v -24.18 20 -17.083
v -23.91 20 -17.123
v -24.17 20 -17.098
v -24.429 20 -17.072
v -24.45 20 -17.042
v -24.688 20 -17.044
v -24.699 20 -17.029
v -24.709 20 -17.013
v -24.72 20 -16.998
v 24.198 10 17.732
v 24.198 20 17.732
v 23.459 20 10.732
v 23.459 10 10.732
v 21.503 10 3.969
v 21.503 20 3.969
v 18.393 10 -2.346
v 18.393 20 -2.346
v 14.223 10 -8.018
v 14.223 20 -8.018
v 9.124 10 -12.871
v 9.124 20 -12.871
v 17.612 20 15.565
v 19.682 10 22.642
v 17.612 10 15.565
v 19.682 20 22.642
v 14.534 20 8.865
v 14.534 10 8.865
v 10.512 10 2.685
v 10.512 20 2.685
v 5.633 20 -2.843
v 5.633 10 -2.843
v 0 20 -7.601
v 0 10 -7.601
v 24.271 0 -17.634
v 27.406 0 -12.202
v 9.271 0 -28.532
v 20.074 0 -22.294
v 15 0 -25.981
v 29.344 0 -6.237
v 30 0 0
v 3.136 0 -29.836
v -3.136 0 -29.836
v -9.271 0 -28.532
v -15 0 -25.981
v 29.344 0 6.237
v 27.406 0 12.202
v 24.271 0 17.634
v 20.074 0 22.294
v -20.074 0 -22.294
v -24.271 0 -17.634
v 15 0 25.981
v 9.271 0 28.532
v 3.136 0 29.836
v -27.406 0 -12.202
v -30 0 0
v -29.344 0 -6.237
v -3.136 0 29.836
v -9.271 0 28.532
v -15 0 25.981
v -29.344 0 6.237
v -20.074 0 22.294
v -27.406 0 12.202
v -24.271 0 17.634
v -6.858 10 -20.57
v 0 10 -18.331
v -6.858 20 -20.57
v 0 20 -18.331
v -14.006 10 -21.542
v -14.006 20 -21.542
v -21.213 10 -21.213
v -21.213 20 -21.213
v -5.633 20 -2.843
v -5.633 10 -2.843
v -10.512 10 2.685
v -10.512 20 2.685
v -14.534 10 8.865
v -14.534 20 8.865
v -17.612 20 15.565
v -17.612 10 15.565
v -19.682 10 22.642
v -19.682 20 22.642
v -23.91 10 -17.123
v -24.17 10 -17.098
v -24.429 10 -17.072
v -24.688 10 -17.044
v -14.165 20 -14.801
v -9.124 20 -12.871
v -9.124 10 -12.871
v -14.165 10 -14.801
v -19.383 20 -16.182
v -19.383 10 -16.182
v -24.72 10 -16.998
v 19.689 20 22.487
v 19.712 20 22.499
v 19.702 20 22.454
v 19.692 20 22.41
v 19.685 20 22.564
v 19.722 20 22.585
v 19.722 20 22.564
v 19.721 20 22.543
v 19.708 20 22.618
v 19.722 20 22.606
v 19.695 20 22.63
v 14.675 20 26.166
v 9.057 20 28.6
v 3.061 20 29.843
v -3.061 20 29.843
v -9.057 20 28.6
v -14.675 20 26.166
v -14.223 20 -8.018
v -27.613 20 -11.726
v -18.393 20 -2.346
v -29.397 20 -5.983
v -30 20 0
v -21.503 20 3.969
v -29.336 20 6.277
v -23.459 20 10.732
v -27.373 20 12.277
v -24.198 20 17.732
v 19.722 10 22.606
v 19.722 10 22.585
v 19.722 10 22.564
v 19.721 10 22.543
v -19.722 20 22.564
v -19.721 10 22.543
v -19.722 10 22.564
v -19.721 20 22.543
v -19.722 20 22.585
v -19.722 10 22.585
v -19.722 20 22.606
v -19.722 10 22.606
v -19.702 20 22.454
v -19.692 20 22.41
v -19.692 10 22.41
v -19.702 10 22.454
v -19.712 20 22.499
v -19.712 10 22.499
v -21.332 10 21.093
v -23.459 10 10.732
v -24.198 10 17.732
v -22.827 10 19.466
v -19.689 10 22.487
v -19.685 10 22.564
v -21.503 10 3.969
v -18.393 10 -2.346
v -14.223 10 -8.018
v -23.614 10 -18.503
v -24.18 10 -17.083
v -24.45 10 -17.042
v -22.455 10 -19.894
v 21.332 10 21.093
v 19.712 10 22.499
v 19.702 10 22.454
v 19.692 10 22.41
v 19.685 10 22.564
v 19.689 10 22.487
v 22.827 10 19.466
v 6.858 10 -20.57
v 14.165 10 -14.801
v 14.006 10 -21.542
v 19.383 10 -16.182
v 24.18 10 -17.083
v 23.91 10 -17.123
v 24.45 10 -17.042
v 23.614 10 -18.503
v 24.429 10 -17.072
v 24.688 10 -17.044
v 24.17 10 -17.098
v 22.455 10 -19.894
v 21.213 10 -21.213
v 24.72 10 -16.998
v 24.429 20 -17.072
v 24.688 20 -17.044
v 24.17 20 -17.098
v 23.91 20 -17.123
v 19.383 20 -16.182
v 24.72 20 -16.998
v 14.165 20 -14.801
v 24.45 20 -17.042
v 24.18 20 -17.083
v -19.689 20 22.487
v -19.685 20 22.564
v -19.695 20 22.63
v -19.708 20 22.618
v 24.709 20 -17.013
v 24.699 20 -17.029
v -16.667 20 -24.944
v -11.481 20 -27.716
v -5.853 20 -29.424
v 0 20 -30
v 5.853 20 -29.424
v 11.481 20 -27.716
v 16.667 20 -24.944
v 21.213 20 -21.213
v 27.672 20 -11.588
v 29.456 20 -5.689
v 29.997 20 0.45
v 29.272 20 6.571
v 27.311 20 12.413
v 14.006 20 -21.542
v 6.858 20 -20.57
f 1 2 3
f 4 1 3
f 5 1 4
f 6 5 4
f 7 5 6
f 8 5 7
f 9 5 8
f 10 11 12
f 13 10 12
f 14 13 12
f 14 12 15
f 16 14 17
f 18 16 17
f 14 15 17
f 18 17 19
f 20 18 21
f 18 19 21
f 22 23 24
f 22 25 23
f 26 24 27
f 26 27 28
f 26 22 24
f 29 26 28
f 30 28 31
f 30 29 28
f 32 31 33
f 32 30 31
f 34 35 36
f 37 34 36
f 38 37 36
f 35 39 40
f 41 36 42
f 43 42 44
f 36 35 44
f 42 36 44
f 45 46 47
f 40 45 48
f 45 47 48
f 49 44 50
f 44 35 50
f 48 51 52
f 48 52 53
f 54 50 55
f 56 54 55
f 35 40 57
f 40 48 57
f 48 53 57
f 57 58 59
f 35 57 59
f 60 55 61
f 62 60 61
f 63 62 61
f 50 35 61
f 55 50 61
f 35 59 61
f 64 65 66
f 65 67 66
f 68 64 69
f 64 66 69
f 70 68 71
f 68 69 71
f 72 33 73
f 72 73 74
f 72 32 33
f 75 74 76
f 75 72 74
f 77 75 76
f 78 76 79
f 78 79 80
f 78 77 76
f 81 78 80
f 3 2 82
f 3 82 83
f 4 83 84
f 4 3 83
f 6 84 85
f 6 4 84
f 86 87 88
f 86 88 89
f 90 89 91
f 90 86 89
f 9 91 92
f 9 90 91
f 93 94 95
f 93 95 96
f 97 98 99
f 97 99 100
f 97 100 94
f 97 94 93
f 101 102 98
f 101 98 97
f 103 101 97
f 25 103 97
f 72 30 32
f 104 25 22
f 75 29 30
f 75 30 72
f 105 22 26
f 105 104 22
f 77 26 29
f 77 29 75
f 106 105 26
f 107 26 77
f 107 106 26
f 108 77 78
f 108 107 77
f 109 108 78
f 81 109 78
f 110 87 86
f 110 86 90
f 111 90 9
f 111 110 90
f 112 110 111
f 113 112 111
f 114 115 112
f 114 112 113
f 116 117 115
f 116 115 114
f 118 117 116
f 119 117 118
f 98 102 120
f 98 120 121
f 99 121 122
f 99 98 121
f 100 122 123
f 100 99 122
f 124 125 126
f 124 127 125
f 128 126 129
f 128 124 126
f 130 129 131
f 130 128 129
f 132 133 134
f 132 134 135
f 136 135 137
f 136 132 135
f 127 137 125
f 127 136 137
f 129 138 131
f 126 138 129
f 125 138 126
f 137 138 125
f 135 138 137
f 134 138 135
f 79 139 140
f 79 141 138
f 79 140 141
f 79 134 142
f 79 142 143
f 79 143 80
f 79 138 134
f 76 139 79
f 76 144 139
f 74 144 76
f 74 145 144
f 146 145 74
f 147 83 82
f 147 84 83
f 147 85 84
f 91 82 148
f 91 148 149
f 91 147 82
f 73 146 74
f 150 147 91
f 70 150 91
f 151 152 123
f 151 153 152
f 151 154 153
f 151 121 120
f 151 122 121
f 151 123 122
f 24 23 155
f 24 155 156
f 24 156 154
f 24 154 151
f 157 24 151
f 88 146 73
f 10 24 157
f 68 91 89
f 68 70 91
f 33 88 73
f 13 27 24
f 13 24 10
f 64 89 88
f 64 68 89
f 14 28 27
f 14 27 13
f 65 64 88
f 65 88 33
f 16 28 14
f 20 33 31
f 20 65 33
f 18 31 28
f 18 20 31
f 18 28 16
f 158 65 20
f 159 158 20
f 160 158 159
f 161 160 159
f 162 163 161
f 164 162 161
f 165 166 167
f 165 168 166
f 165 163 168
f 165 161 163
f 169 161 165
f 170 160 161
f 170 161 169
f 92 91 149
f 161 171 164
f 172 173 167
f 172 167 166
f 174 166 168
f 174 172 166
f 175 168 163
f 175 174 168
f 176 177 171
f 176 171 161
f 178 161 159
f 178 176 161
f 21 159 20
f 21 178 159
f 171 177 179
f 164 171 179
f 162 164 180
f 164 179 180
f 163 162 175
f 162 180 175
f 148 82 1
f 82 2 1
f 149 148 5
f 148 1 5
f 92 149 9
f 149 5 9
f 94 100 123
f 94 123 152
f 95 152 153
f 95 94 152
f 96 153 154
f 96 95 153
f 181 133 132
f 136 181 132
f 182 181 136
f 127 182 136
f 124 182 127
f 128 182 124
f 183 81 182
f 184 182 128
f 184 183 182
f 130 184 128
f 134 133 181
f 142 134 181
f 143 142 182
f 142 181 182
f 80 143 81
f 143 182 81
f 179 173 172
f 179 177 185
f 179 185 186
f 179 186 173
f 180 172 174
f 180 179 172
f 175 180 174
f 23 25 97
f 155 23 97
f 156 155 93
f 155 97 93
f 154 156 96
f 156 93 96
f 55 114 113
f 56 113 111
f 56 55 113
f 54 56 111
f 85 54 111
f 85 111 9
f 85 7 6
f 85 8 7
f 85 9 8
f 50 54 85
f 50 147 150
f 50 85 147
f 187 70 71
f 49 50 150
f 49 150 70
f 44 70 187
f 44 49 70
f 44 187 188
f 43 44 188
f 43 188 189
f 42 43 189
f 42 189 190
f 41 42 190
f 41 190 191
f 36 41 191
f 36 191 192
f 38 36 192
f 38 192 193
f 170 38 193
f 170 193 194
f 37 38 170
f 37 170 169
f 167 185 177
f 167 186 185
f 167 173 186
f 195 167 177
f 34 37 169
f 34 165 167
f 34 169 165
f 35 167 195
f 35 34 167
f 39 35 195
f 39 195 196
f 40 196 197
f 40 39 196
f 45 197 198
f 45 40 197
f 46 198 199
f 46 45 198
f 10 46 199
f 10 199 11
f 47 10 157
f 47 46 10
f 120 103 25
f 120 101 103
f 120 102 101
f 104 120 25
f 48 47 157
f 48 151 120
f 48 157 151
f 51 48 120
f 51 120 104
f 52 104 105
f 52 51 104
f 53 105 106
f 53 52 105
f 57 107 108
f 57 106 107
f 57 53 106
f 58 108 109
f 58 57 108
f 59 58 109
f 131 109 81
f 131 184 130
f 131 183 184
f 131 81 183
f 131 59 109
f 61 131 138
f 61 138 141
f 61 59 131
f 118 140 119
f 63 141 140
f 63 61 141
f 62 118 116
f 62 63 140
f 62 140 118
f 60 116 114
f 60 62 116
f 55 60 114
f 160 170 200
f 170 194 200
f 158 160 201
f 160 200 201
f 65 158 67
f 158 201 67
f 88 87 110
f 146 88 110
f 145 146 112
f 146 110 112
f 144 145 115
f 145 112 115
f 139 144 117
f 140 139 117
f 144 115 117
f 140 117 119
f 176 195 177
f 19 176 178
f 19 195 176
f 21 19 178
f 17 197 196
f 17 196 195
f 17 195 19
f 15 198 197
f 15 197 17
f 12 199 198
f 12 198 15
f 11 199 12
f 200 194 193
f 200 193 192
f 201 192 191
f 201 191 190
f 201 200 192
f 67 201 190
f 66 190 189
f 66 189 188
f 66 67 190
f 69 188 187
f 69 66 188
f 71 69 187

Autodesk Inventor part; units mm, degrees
ref_plane "YZ Plane" through (0, 0, 0) normal (1, 0, 0) x (0, 1, 0)
ref_plane "XZ Plane" through (0, 0, 0) normal (0, 1, 0) x (-1, 0, 0)
ref_plane "XY Plane" through (0, 0, 0) normal (0, 0, 1) x (1, 0, 0)
sketch "Esboço1" plane through (0, 0, 0) normal (0, 1, 0) x (-1, 0, 0)
  circle A0 centre (0, 0) radius 30
extrude "Extrusão1" add sketch "Esboço1" along normal blind 20
sketch "Esboço2" plane through (0, 20, 0) normal (0, 1, 0) x (1, 0, 0)
  circle A0 centre (0, 0) radius 30 projected
  arc A1 (21.2132, 21.2132) -> (-24.1983, -17.7325) centre (15.7958, -18.4182) ccw
  arc A2 (24.1983, -17.7325) -> (-21.2132, 21.2132) centre (-15.7958, -18.4182) ccw
  arc A3 (24.688, 17.0441) -> (-19.7217, -22.6065) centre (20.2782, -22.7121) ccw
  arc A4 (19.7217, -22.6065) -> (-24.688, 17.0441) centre (-20.2782, -22.7121) ccw
  point P0 (-6.4534, 14.8229)
  point P1 (0, 11.7668)
  point P2 (6.4534, 14.8229)
  point P3 (0, 18.3308)
extrude "Extrusão2" cut sketch "Esboço2" against normal blind 10 contours A3 A2 A1 A0 | A0 A4 A3 A2 | A3 A4 A1 A2 | A2 A1 A4 A0 | A3 A0 A1 A4
sketch "Esboço3" plane through (0, 20, 0) normal (0, 1, 0) x (1, 0, 0)
  circle A0 centre (0, 0) radius 30 projected
  arc A1 (-6.4534, 14.8229) -> (-24.688, 17.0441) centre (-20.2782, -22.7121) ccw projected
  arc A2 (19.733, -22.5966) -> (-24.688, 17.0441) centre (-29.6453, -33.2202) ccw
  arc A3 (24.688, 17.0441) -> (-19.733, -22.5966) centre (29.6453, -33.2202) ccw
  arc A4 (19.7217, -22.6065) -> (0, 11.7668) centre (-20.2782, -22.7121) ccw projected
  arc A5 (19.733, -22.5966) -> (0, 11.7668) centre (-9.6777, -16.638) ccw
  arc A6 (0, 11.7668) -> (-19.733, -22.5966) centre (6.925, -15.0573) ccw
  point P0 (0, 7.6727)
  point P1 (19.7215, -22.5432)
extrude "Extrusão3" cut sketch "Esboço3" against normal blind 10 contours A2 A3 A4 | A6 A2 A3 | A6 A4 A3 A2
sketch "Esboço4" plane through (0, 20, 0) normal (0, 1, 0) x (1, 0, 0)
  circle A0 centre (0, 0) radius 30 projected
  arc A1 (19.6815, -22.6415) -> (-24.7197, 16.9981) centre (-29.6674, -33.2312) ccw
  arc A2 (24.7197, 16.9981) -> (-19.6815, -22.6415) centre (29.6674, -33.2312) ccw
  arc A3 (24.7197, 16.9981) -> (-19.6815, -22.6415) centre (18.4995, -20.7217) ccw
  arc A4 (19.6815, -22.6415) -> (-24.7197, 16.9981) centre (-18.4995, -20.7217) ccw
  point P0 (3.9682, 10.2085)
  point P1 (0, 12.7334)
  point P2 (-3.9682, 10.2085)
  point P3 (0, 7.6014)
extrude "Extrusão4" cut sketch "Esboço4" against normal blind 10 contours A2 A4 A3 | A1 A2 A4 | A4 A3 A1 | A2 A1 A3 A4 | A3 A1 A2
properties part number "Xbox Simbol"
